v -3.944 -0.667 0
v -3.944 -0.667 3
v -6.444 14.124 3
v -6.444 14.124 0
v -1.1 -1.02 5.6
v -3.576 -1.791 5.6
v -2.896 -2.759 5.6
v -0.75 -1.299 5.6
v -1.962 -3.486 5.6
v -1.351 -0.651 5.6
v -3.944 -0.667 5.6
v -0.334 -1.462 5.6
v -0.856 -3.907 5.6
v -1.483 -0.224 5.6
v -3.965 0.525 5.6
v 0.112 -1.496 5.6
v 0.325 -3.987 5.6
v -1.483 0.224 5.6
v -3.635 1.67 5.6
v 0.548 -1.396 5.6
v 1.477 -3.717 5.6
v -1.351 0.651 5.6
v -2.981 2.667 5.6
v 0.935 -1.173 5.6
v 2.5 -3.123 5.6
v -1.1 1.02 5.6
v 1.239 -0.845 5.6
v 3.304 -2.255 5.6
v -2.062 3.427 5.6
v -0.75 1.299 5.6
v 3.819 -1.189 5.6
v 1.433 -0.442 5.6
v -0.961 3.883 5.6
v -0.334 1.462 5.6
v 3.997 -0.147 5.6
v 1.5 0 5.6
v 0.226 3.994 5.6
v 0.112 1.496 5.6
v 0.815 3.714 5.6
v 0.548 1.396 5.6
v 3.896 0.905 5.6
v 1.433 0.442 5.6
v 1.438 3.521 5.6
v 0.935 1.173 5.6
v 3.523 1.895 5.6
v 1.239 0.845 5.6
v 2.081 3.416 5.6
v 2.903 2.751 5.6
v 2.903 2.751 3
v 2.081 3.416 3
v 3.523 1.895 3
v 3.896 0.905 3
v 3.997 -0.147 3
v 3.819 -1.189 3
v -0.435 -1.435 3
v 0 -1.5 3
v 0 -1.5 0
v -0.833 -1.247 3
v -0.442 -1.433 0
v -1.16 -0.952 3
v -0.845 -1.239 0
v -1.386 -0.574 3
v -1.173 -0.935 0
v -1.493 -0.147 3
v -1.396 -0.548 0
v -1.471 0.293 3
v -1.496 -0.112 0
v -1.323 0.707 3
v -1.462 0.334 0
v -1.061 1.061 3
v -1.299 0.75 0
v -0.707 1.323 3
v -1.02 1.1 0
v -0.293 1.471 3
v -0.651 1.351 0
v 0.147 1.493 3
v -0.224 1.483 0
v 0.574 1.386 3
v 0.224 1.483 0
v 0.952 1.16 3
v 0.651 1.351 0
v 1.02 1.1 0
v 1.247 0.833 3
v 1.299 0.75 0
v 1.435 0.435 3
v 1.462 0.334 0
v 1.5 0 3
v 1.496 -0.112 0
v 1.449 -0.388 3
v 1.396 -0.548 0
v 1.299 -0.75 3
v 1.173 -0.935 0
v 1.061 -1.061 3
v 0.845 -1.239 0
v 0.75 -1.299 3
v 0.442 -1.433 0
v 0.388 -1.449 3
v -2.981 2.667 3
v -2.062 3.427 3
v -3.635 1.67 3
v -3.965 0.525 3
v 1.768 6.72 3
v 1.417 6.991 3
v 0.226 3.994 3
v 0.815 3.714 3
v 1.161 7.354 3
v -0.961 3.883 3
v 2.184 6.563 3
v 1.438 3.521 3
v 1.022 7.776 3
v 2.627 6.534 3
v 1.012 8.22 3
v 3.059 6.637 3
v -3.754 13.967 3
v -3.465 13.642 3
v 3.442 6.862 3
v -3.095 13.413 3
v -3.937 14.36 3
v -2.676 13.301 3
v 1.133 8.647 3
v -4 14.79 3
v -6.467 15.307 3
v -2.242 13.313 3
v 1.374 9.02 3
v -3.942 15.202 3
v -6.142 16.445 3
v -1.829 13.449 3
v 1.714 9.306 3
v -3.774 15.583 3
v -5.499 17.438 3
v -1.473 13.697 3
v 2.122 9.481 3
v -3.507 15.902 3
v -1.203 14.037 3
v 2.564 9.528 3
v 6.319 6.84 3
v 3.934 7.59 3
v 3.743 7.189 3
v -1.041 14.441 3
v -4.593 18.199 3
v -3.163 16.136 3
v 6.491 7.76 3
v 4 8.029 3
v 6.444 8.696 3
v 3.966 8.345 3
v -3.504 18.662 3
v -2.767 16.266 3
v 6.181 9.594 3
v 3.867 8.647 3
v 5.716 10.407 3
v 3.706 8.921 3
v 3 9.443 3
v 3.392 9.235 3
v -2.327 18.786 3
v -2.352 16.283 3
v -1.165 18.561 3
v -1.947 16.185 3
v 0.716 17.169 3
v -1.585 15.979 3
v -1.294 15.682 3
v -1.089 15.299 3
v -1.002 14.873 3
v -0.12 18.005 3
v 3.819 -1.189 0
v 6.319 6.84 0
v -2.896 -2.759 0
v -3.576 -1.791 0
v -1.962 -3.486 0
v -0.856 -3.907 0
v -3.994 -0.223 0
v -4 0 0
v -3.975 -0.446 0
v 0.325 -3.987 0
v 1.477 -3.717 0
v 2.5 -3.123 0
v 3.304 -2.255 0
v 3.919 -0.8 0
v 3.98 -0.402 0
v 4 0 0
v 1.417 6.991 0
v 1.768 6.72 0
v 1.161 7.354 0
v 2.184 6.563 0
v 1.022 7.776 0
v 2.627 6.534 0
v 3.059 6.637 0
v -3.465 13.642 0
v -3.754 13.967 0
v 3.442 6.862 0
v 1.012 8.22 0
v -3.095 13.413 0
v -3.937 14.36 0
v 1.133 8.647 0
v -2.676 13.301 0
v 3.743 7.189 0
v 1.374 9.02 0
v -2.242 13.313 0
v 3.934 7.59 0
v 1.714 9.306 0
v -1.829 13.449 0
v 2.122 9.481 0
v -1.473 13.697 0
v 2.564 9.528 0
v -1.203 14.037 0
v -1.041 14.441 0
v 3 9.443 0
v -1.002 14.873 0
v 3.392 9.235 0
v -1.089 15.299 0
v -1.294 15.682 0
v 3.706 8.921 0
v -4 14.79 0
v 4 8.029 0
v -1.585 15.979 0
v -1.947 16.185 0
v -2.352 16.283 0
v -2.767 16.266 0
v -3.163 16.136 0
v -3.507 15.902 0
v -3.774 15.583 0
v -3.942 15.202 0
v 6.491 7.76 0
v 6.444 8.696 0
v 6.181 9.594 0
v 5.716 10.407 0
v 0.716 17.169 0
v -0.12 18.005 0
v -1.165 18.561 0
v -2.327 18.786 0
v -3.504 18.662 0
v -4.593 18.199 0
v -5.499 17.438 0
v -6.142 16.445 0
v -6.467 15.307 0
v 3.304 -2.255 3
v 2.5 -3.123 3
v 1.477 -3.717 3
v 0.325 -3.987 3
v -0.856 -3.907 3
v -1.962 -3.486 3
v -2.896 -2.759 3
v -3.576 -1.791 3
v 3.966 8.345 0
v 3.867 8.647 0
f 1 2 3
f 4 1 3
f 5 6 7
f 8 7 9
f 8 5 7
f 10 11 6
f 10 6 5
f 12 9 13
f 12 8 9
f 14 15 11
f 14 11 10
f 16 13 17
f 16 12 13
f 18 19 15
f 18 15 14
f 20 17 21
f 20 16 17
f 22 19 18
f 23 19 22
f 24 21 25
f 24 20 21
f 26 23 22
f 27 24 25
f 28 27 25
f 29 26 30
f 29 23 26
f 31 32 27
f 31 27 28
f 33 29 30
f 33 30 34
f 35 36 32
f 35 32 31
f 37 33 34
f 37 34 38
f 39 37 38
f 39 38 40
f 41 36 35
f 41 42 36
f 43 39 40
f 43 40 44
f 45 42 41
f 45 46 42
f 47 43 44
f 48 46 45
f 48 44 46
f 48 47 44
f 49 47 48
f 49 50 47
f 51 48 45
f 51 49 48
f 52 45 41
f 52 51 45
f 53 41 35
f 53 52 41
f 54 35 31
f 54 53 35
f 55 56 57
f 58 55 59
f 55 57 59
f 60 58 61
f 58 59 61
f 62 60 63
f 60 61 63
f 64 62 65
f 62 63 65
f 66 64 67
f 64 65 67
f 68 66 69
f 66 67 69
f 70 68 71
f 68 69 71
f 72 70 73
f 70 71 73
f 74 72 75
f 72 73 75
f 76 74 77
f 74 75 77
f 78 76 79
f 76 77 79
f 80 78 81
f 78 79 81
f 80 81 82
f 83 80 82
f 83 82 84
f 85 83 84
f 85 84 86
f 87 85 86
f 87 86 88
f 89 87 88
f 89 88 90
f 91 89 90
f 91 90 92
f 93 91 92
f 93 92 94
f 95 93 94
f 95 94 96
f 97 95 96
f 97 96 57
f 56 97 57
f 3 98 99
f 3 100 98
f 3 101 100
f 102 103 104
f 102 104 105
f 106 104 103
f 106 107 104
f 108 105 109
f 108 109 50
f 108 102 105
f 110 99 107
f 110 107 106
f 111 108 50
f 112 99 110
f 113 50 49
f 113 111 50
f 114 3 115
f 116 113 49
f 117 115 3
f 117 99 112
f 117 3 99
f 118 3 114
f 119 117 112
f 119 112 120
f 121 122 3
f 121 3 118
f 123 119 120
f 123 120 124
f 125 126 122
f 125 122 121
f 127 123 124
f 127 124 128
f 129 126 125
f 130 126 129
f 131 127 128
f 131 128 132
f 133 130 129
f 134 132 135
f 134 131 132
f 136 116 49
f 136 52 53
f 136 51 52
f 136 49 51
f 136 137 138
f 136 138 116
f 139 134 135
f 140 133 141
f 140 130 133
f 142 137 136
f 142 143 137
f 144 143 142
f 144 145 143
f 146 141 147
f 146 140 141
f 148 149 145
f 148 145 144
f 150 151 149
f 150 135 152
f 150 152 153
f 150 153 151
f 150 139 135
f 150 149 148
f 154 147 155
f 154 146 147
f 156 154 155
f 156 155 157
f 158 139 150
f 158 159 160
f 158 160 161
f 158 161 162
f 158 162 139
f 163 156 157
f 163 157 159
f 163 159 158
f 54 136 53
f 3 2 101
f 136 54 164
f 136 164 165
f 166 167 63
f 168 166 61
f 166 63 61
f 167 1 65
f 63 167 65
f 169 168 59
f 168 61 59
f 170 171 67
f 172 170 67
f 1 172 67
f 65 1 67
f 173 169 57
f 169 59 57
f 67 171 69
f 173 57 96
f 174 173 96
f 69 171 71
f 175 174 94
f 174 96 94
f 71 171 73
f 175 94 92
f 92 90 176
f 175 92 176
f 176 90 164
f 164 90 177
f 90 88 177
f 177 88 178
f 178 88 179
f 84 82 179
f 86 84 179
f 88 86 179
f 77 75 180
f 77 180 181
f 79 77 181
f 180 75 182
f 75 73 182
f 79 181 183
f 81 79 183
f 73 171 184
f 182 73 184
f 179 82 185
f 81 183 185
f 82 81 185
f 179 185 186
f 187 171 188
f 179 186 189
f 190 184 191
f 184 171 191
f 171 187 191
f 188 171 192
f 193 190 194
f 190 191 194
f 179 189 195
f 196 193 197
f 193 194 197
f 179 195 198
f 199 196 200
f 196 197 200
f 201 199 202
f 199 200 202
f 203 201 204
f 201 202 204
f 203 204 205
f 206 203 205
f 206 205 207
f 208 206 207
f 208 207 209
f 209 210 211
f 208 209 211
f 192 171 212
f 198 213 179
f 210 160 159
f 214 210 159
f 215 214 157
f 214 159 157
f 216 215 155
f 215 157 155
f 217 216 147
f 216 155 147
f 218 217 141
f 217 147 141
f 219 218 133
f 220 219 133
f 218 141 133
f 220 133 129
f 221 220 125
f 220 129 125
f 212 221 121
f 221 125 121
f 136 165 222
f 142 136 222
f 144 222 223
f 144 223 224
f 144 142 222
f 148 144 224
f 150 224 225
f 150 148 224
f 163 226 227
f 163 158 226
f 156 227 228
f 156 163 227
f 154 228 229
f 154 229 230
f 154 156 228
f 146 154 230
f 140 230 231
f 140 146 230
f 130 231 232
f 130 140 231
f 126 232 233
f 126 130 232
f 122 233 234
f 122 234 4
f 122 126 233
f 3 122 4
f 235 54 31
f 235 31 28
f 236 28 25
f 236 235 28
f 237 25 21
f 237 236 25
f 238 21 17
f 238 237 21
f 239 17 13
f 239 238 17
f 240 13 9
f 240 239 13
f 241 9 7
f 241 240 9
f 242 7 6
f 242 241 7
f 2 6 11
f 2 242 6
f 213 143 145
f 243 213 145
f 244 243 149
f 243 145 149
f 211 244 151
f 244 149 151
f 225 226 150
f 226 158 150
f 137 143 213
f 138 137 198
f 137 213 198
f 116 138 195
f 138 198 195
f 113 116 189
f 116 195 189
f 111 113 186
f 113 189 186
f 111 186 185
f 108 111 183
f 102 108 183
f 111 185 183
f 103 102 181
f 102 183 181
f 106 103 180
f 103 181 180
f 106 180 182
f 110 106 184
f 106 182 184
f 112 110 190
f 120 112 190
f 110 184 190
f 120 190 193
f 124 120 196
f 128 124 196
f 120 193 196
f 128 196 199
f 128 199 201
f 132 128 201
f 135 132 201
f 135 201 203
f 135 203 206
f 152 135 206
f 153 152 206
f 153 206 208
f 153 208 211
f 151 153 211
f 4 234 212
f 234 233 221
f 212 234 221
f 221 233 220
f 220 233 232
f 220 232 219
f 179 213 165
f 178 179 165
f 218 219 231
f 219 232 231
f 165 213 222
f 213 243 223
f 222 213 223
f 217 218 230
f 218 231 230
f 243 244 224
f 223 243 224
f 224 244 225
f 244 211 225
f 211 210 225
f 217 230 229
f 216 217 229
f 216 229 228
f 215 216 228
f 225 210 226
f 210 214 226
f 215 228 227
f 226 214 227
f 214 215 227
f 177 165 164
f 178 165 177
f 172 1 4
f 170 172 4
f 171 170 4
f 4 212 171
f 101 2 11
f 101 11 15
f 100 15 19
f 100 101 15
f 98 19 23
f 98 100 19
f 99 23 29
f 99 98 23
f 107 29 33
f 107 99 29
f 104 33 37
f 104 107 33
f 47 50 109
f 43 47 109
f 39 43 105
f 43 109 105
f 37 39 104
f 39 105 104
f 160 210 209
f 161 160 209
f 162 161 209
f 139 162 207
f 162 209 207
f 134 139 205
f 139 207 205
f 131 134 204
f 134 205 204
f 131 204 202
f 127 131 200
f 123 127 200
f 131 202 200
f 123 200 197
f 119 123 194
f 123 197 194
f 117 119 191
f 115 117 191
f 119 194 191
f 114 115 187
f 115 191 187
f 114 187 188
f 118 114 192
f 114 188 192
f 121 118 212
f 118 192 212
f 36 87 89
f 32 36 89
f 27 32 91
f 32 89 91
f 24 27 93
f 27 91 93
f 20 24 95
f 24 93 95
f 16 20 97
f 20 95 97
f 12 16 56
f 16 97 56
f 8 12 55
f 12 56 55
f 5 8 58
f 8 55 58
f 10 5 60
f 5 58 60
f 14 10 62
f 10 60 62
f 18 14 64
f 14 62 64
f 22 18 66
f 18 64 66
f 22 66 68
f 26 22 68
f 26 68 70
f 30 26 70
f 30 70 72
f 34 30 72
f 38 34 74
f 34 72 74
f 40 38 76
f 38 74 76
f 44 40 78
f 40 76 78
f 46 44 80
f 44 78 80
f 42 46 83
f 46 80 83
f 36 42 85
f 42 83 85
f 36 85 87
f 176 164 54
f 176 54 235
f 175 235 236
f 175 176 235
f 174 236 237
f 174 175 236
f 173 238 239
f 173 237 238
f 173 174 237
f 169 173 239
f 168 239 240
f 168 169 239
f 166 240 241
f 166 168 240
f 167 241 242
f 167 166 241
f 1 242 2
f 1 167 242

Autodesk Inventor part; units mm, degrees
ref_plane "YZ Plane" through (0, 0, 0) normal (1, 0, 0) x (0, 1, 0)
ref_plane "XZ Plane" through (0, 0, 0) normal (0, 1, 0) x (-1, 0, 0)
ref_plane "XY Plane" through (0, 0, 0) normal (0, 0, 1) x (1, 0, 0)
sketch "Skizze1" plane through (0, 0, 0) normal (0, 0, 1) x (1, 0, 0)
  circle A0 centre (0, 0) radius 4
  circle A1 centre (-2.5, 14.7902) radius 1.5
  circle A2 centre (2.5, 8.029) radius 1.5
  line L0 (-4, 0) -> (-4, 14.7902)
  line L1 (-1.294, 15.6821) -> (3.706, 8.9208)
  line L2 (4, 8.029) -> (4, 0)
  line L3 (0, 0) -> (-2.5, 14.7902) construction
  line L4 (2.5, 8.029) -> (-1.25, 7.3951) construction
  dimension "d0" = 8
  dimension "d1" = 3
  dimension "d3" = 15
extrude "Extrusion1" add sketch "Skizze1" along normal blind 3
sketch "Skizze2" plane through (0, 0, 3) normal (0, 0, 1) x (1, 0, 0)
  arc A0 (4, 8.029) -> (3.706, 8.9208) centre (2.5, 8.029) ccw projected
  arc A1 (-1.294, 15.6821) -> (-4, 14.7902) centre (-2.5, 14.7902) ccw projected
  arc A2 (-4, 0) -> (4, 0) centre (0, 0) ccw projected
hole "Bohrung1" at (2.5, 8.029, 3) at (-2.5, 14.7902, 3) at (0, 0, 3) direction (0, 0, -1) diameter 3 end through all
sketch "Skizze3" plane through (0, 0, 3) normal (0, 0, 1) x (1, 0, 0)
  circle A0 centre (-2.5, 14.7902) radius 1.5 projected
  circle A1 centre (2.5, 8.029) radius 1.5 projected
  arc A2 (4, 8.029) -> (3.706, 8.9208) centre (2.5, 8.029) ccw projected
  line L0 (3.706, 8.9208) -> (-1.294, 15.6821) projected
  arc A3 (-1.294, 15.6821) -> (-4, 14.7902) centre (-2.5, 14.7902) ccw projected
  line L1 (-4, 14.7902) -> (-4, 0) projected
  arc A4 (-4, 0) -> (4, 0) centre (0, 0) ccw projected
  line L2 (4, 0) -> (4, 8.029) projected
  arc A5 (0.7161, 17.1686) -> (-6.4441, 14.1235) centre (-2.5, 14.7902) ccw
  arc A6 (6.3191, 6.8398) -> (5.7161, 10.4073) centre (2.5, 8.029) ccw
  arc A7 (-3.9441, -0.6667) -> (3.8191, -1.1892) centre (0, 0) ccw
  line L3 (3.8191, -1.1892) -> (6.3191, 6.8398)
  line L4 (-3.9441, -0.6667) -> (-6.4441, 14.1235)
  line L5 (0.7161, 17.1686) -> (5.7161, 10.4073)
  circle A8 centre (0, 0) radius 1.5 projected
  dimension "d13" = 2.5
  dimension "d14" = 2.5
  dimension "d24" = 2.5
extrude "Extrusion2" add sketch "Skizze3" against normal up to surface (3 mm away) contours A0 L1 A4 L4 A5 L5 A6 L3 L2 A1 L0
sketch "Skizze4" plane through (0, 0, 3) normal (0, 0, 1) x (1, 0, 0)
  arc A0 (6.3191, 6.8398) -> (5.7161, 10.4073) centre (2.5, 8.029) ccw projected
  arc A1 (0.7161, 17.1686) -> (-6.4441, 14.1235) centre (-2.5, 14.7902) ccw projected
  arc A2 (0.2281, 11.8649) -> (-0.5021, 11.3249) centre (2.5, 8.029) ccw
  arc A3 (0.2281, 11.8649) -> (0.7161, 17.1686) centre (-2.5, 14.7902) ccw
  arc A4 (-6.4441, 14.1235) -> (-0.5021, 11.3249) centre (-2.5, 14.7902) ccw
  circle A5 centre (2.5, 8.029) radius 1.5 projected
  arc A6 (-3.9441, -0.6667) -> (3.8191, -1.1892) centre (0, 0) ccw projected
  arc A7 (0.2261, 3.9936) -> (2.081, 3.416) centre (0, 0) ccw
  arc A8 (0.2261, 3.9936) -> (2.081, 3.416) centre (2.5, 8.029) ccw
  circle A9 centre (0, 0) radius 1.5 projected
extrude "Extrusion3" add sketch "Skizze4" along normal blind 2.6 contours A7 A8 A6
equation "\"d0\" = 2 * bearingWall"
equation "\"d1\" = bearingHole"
equation "\"d3\" = Hebel_basis_2"
equation "\"d4\" = Join_width"
equation "\"d6\" = bearingHole"
equation "\"d13\" = d24"
equation "\"d14\" = d13"
equation "\"FingerLaenge_B\" = 25"
equation "\"Hebel_B\" = 25"
equation "\"Finger_width\" = 22"
equation "\"Finger_diameter\" = 8"
equation "\"FingerWall\" = 3"
equation "\"Hebel_basis_2\" = 15"
equation "\"Join_width\" = 3"
equation "\"bearingHole\" = 3"
equation "\"bearingWall\" = 4"
equation "\"support_D\" = 0.25"
properties part number "3_hebenMount_2_dual"
